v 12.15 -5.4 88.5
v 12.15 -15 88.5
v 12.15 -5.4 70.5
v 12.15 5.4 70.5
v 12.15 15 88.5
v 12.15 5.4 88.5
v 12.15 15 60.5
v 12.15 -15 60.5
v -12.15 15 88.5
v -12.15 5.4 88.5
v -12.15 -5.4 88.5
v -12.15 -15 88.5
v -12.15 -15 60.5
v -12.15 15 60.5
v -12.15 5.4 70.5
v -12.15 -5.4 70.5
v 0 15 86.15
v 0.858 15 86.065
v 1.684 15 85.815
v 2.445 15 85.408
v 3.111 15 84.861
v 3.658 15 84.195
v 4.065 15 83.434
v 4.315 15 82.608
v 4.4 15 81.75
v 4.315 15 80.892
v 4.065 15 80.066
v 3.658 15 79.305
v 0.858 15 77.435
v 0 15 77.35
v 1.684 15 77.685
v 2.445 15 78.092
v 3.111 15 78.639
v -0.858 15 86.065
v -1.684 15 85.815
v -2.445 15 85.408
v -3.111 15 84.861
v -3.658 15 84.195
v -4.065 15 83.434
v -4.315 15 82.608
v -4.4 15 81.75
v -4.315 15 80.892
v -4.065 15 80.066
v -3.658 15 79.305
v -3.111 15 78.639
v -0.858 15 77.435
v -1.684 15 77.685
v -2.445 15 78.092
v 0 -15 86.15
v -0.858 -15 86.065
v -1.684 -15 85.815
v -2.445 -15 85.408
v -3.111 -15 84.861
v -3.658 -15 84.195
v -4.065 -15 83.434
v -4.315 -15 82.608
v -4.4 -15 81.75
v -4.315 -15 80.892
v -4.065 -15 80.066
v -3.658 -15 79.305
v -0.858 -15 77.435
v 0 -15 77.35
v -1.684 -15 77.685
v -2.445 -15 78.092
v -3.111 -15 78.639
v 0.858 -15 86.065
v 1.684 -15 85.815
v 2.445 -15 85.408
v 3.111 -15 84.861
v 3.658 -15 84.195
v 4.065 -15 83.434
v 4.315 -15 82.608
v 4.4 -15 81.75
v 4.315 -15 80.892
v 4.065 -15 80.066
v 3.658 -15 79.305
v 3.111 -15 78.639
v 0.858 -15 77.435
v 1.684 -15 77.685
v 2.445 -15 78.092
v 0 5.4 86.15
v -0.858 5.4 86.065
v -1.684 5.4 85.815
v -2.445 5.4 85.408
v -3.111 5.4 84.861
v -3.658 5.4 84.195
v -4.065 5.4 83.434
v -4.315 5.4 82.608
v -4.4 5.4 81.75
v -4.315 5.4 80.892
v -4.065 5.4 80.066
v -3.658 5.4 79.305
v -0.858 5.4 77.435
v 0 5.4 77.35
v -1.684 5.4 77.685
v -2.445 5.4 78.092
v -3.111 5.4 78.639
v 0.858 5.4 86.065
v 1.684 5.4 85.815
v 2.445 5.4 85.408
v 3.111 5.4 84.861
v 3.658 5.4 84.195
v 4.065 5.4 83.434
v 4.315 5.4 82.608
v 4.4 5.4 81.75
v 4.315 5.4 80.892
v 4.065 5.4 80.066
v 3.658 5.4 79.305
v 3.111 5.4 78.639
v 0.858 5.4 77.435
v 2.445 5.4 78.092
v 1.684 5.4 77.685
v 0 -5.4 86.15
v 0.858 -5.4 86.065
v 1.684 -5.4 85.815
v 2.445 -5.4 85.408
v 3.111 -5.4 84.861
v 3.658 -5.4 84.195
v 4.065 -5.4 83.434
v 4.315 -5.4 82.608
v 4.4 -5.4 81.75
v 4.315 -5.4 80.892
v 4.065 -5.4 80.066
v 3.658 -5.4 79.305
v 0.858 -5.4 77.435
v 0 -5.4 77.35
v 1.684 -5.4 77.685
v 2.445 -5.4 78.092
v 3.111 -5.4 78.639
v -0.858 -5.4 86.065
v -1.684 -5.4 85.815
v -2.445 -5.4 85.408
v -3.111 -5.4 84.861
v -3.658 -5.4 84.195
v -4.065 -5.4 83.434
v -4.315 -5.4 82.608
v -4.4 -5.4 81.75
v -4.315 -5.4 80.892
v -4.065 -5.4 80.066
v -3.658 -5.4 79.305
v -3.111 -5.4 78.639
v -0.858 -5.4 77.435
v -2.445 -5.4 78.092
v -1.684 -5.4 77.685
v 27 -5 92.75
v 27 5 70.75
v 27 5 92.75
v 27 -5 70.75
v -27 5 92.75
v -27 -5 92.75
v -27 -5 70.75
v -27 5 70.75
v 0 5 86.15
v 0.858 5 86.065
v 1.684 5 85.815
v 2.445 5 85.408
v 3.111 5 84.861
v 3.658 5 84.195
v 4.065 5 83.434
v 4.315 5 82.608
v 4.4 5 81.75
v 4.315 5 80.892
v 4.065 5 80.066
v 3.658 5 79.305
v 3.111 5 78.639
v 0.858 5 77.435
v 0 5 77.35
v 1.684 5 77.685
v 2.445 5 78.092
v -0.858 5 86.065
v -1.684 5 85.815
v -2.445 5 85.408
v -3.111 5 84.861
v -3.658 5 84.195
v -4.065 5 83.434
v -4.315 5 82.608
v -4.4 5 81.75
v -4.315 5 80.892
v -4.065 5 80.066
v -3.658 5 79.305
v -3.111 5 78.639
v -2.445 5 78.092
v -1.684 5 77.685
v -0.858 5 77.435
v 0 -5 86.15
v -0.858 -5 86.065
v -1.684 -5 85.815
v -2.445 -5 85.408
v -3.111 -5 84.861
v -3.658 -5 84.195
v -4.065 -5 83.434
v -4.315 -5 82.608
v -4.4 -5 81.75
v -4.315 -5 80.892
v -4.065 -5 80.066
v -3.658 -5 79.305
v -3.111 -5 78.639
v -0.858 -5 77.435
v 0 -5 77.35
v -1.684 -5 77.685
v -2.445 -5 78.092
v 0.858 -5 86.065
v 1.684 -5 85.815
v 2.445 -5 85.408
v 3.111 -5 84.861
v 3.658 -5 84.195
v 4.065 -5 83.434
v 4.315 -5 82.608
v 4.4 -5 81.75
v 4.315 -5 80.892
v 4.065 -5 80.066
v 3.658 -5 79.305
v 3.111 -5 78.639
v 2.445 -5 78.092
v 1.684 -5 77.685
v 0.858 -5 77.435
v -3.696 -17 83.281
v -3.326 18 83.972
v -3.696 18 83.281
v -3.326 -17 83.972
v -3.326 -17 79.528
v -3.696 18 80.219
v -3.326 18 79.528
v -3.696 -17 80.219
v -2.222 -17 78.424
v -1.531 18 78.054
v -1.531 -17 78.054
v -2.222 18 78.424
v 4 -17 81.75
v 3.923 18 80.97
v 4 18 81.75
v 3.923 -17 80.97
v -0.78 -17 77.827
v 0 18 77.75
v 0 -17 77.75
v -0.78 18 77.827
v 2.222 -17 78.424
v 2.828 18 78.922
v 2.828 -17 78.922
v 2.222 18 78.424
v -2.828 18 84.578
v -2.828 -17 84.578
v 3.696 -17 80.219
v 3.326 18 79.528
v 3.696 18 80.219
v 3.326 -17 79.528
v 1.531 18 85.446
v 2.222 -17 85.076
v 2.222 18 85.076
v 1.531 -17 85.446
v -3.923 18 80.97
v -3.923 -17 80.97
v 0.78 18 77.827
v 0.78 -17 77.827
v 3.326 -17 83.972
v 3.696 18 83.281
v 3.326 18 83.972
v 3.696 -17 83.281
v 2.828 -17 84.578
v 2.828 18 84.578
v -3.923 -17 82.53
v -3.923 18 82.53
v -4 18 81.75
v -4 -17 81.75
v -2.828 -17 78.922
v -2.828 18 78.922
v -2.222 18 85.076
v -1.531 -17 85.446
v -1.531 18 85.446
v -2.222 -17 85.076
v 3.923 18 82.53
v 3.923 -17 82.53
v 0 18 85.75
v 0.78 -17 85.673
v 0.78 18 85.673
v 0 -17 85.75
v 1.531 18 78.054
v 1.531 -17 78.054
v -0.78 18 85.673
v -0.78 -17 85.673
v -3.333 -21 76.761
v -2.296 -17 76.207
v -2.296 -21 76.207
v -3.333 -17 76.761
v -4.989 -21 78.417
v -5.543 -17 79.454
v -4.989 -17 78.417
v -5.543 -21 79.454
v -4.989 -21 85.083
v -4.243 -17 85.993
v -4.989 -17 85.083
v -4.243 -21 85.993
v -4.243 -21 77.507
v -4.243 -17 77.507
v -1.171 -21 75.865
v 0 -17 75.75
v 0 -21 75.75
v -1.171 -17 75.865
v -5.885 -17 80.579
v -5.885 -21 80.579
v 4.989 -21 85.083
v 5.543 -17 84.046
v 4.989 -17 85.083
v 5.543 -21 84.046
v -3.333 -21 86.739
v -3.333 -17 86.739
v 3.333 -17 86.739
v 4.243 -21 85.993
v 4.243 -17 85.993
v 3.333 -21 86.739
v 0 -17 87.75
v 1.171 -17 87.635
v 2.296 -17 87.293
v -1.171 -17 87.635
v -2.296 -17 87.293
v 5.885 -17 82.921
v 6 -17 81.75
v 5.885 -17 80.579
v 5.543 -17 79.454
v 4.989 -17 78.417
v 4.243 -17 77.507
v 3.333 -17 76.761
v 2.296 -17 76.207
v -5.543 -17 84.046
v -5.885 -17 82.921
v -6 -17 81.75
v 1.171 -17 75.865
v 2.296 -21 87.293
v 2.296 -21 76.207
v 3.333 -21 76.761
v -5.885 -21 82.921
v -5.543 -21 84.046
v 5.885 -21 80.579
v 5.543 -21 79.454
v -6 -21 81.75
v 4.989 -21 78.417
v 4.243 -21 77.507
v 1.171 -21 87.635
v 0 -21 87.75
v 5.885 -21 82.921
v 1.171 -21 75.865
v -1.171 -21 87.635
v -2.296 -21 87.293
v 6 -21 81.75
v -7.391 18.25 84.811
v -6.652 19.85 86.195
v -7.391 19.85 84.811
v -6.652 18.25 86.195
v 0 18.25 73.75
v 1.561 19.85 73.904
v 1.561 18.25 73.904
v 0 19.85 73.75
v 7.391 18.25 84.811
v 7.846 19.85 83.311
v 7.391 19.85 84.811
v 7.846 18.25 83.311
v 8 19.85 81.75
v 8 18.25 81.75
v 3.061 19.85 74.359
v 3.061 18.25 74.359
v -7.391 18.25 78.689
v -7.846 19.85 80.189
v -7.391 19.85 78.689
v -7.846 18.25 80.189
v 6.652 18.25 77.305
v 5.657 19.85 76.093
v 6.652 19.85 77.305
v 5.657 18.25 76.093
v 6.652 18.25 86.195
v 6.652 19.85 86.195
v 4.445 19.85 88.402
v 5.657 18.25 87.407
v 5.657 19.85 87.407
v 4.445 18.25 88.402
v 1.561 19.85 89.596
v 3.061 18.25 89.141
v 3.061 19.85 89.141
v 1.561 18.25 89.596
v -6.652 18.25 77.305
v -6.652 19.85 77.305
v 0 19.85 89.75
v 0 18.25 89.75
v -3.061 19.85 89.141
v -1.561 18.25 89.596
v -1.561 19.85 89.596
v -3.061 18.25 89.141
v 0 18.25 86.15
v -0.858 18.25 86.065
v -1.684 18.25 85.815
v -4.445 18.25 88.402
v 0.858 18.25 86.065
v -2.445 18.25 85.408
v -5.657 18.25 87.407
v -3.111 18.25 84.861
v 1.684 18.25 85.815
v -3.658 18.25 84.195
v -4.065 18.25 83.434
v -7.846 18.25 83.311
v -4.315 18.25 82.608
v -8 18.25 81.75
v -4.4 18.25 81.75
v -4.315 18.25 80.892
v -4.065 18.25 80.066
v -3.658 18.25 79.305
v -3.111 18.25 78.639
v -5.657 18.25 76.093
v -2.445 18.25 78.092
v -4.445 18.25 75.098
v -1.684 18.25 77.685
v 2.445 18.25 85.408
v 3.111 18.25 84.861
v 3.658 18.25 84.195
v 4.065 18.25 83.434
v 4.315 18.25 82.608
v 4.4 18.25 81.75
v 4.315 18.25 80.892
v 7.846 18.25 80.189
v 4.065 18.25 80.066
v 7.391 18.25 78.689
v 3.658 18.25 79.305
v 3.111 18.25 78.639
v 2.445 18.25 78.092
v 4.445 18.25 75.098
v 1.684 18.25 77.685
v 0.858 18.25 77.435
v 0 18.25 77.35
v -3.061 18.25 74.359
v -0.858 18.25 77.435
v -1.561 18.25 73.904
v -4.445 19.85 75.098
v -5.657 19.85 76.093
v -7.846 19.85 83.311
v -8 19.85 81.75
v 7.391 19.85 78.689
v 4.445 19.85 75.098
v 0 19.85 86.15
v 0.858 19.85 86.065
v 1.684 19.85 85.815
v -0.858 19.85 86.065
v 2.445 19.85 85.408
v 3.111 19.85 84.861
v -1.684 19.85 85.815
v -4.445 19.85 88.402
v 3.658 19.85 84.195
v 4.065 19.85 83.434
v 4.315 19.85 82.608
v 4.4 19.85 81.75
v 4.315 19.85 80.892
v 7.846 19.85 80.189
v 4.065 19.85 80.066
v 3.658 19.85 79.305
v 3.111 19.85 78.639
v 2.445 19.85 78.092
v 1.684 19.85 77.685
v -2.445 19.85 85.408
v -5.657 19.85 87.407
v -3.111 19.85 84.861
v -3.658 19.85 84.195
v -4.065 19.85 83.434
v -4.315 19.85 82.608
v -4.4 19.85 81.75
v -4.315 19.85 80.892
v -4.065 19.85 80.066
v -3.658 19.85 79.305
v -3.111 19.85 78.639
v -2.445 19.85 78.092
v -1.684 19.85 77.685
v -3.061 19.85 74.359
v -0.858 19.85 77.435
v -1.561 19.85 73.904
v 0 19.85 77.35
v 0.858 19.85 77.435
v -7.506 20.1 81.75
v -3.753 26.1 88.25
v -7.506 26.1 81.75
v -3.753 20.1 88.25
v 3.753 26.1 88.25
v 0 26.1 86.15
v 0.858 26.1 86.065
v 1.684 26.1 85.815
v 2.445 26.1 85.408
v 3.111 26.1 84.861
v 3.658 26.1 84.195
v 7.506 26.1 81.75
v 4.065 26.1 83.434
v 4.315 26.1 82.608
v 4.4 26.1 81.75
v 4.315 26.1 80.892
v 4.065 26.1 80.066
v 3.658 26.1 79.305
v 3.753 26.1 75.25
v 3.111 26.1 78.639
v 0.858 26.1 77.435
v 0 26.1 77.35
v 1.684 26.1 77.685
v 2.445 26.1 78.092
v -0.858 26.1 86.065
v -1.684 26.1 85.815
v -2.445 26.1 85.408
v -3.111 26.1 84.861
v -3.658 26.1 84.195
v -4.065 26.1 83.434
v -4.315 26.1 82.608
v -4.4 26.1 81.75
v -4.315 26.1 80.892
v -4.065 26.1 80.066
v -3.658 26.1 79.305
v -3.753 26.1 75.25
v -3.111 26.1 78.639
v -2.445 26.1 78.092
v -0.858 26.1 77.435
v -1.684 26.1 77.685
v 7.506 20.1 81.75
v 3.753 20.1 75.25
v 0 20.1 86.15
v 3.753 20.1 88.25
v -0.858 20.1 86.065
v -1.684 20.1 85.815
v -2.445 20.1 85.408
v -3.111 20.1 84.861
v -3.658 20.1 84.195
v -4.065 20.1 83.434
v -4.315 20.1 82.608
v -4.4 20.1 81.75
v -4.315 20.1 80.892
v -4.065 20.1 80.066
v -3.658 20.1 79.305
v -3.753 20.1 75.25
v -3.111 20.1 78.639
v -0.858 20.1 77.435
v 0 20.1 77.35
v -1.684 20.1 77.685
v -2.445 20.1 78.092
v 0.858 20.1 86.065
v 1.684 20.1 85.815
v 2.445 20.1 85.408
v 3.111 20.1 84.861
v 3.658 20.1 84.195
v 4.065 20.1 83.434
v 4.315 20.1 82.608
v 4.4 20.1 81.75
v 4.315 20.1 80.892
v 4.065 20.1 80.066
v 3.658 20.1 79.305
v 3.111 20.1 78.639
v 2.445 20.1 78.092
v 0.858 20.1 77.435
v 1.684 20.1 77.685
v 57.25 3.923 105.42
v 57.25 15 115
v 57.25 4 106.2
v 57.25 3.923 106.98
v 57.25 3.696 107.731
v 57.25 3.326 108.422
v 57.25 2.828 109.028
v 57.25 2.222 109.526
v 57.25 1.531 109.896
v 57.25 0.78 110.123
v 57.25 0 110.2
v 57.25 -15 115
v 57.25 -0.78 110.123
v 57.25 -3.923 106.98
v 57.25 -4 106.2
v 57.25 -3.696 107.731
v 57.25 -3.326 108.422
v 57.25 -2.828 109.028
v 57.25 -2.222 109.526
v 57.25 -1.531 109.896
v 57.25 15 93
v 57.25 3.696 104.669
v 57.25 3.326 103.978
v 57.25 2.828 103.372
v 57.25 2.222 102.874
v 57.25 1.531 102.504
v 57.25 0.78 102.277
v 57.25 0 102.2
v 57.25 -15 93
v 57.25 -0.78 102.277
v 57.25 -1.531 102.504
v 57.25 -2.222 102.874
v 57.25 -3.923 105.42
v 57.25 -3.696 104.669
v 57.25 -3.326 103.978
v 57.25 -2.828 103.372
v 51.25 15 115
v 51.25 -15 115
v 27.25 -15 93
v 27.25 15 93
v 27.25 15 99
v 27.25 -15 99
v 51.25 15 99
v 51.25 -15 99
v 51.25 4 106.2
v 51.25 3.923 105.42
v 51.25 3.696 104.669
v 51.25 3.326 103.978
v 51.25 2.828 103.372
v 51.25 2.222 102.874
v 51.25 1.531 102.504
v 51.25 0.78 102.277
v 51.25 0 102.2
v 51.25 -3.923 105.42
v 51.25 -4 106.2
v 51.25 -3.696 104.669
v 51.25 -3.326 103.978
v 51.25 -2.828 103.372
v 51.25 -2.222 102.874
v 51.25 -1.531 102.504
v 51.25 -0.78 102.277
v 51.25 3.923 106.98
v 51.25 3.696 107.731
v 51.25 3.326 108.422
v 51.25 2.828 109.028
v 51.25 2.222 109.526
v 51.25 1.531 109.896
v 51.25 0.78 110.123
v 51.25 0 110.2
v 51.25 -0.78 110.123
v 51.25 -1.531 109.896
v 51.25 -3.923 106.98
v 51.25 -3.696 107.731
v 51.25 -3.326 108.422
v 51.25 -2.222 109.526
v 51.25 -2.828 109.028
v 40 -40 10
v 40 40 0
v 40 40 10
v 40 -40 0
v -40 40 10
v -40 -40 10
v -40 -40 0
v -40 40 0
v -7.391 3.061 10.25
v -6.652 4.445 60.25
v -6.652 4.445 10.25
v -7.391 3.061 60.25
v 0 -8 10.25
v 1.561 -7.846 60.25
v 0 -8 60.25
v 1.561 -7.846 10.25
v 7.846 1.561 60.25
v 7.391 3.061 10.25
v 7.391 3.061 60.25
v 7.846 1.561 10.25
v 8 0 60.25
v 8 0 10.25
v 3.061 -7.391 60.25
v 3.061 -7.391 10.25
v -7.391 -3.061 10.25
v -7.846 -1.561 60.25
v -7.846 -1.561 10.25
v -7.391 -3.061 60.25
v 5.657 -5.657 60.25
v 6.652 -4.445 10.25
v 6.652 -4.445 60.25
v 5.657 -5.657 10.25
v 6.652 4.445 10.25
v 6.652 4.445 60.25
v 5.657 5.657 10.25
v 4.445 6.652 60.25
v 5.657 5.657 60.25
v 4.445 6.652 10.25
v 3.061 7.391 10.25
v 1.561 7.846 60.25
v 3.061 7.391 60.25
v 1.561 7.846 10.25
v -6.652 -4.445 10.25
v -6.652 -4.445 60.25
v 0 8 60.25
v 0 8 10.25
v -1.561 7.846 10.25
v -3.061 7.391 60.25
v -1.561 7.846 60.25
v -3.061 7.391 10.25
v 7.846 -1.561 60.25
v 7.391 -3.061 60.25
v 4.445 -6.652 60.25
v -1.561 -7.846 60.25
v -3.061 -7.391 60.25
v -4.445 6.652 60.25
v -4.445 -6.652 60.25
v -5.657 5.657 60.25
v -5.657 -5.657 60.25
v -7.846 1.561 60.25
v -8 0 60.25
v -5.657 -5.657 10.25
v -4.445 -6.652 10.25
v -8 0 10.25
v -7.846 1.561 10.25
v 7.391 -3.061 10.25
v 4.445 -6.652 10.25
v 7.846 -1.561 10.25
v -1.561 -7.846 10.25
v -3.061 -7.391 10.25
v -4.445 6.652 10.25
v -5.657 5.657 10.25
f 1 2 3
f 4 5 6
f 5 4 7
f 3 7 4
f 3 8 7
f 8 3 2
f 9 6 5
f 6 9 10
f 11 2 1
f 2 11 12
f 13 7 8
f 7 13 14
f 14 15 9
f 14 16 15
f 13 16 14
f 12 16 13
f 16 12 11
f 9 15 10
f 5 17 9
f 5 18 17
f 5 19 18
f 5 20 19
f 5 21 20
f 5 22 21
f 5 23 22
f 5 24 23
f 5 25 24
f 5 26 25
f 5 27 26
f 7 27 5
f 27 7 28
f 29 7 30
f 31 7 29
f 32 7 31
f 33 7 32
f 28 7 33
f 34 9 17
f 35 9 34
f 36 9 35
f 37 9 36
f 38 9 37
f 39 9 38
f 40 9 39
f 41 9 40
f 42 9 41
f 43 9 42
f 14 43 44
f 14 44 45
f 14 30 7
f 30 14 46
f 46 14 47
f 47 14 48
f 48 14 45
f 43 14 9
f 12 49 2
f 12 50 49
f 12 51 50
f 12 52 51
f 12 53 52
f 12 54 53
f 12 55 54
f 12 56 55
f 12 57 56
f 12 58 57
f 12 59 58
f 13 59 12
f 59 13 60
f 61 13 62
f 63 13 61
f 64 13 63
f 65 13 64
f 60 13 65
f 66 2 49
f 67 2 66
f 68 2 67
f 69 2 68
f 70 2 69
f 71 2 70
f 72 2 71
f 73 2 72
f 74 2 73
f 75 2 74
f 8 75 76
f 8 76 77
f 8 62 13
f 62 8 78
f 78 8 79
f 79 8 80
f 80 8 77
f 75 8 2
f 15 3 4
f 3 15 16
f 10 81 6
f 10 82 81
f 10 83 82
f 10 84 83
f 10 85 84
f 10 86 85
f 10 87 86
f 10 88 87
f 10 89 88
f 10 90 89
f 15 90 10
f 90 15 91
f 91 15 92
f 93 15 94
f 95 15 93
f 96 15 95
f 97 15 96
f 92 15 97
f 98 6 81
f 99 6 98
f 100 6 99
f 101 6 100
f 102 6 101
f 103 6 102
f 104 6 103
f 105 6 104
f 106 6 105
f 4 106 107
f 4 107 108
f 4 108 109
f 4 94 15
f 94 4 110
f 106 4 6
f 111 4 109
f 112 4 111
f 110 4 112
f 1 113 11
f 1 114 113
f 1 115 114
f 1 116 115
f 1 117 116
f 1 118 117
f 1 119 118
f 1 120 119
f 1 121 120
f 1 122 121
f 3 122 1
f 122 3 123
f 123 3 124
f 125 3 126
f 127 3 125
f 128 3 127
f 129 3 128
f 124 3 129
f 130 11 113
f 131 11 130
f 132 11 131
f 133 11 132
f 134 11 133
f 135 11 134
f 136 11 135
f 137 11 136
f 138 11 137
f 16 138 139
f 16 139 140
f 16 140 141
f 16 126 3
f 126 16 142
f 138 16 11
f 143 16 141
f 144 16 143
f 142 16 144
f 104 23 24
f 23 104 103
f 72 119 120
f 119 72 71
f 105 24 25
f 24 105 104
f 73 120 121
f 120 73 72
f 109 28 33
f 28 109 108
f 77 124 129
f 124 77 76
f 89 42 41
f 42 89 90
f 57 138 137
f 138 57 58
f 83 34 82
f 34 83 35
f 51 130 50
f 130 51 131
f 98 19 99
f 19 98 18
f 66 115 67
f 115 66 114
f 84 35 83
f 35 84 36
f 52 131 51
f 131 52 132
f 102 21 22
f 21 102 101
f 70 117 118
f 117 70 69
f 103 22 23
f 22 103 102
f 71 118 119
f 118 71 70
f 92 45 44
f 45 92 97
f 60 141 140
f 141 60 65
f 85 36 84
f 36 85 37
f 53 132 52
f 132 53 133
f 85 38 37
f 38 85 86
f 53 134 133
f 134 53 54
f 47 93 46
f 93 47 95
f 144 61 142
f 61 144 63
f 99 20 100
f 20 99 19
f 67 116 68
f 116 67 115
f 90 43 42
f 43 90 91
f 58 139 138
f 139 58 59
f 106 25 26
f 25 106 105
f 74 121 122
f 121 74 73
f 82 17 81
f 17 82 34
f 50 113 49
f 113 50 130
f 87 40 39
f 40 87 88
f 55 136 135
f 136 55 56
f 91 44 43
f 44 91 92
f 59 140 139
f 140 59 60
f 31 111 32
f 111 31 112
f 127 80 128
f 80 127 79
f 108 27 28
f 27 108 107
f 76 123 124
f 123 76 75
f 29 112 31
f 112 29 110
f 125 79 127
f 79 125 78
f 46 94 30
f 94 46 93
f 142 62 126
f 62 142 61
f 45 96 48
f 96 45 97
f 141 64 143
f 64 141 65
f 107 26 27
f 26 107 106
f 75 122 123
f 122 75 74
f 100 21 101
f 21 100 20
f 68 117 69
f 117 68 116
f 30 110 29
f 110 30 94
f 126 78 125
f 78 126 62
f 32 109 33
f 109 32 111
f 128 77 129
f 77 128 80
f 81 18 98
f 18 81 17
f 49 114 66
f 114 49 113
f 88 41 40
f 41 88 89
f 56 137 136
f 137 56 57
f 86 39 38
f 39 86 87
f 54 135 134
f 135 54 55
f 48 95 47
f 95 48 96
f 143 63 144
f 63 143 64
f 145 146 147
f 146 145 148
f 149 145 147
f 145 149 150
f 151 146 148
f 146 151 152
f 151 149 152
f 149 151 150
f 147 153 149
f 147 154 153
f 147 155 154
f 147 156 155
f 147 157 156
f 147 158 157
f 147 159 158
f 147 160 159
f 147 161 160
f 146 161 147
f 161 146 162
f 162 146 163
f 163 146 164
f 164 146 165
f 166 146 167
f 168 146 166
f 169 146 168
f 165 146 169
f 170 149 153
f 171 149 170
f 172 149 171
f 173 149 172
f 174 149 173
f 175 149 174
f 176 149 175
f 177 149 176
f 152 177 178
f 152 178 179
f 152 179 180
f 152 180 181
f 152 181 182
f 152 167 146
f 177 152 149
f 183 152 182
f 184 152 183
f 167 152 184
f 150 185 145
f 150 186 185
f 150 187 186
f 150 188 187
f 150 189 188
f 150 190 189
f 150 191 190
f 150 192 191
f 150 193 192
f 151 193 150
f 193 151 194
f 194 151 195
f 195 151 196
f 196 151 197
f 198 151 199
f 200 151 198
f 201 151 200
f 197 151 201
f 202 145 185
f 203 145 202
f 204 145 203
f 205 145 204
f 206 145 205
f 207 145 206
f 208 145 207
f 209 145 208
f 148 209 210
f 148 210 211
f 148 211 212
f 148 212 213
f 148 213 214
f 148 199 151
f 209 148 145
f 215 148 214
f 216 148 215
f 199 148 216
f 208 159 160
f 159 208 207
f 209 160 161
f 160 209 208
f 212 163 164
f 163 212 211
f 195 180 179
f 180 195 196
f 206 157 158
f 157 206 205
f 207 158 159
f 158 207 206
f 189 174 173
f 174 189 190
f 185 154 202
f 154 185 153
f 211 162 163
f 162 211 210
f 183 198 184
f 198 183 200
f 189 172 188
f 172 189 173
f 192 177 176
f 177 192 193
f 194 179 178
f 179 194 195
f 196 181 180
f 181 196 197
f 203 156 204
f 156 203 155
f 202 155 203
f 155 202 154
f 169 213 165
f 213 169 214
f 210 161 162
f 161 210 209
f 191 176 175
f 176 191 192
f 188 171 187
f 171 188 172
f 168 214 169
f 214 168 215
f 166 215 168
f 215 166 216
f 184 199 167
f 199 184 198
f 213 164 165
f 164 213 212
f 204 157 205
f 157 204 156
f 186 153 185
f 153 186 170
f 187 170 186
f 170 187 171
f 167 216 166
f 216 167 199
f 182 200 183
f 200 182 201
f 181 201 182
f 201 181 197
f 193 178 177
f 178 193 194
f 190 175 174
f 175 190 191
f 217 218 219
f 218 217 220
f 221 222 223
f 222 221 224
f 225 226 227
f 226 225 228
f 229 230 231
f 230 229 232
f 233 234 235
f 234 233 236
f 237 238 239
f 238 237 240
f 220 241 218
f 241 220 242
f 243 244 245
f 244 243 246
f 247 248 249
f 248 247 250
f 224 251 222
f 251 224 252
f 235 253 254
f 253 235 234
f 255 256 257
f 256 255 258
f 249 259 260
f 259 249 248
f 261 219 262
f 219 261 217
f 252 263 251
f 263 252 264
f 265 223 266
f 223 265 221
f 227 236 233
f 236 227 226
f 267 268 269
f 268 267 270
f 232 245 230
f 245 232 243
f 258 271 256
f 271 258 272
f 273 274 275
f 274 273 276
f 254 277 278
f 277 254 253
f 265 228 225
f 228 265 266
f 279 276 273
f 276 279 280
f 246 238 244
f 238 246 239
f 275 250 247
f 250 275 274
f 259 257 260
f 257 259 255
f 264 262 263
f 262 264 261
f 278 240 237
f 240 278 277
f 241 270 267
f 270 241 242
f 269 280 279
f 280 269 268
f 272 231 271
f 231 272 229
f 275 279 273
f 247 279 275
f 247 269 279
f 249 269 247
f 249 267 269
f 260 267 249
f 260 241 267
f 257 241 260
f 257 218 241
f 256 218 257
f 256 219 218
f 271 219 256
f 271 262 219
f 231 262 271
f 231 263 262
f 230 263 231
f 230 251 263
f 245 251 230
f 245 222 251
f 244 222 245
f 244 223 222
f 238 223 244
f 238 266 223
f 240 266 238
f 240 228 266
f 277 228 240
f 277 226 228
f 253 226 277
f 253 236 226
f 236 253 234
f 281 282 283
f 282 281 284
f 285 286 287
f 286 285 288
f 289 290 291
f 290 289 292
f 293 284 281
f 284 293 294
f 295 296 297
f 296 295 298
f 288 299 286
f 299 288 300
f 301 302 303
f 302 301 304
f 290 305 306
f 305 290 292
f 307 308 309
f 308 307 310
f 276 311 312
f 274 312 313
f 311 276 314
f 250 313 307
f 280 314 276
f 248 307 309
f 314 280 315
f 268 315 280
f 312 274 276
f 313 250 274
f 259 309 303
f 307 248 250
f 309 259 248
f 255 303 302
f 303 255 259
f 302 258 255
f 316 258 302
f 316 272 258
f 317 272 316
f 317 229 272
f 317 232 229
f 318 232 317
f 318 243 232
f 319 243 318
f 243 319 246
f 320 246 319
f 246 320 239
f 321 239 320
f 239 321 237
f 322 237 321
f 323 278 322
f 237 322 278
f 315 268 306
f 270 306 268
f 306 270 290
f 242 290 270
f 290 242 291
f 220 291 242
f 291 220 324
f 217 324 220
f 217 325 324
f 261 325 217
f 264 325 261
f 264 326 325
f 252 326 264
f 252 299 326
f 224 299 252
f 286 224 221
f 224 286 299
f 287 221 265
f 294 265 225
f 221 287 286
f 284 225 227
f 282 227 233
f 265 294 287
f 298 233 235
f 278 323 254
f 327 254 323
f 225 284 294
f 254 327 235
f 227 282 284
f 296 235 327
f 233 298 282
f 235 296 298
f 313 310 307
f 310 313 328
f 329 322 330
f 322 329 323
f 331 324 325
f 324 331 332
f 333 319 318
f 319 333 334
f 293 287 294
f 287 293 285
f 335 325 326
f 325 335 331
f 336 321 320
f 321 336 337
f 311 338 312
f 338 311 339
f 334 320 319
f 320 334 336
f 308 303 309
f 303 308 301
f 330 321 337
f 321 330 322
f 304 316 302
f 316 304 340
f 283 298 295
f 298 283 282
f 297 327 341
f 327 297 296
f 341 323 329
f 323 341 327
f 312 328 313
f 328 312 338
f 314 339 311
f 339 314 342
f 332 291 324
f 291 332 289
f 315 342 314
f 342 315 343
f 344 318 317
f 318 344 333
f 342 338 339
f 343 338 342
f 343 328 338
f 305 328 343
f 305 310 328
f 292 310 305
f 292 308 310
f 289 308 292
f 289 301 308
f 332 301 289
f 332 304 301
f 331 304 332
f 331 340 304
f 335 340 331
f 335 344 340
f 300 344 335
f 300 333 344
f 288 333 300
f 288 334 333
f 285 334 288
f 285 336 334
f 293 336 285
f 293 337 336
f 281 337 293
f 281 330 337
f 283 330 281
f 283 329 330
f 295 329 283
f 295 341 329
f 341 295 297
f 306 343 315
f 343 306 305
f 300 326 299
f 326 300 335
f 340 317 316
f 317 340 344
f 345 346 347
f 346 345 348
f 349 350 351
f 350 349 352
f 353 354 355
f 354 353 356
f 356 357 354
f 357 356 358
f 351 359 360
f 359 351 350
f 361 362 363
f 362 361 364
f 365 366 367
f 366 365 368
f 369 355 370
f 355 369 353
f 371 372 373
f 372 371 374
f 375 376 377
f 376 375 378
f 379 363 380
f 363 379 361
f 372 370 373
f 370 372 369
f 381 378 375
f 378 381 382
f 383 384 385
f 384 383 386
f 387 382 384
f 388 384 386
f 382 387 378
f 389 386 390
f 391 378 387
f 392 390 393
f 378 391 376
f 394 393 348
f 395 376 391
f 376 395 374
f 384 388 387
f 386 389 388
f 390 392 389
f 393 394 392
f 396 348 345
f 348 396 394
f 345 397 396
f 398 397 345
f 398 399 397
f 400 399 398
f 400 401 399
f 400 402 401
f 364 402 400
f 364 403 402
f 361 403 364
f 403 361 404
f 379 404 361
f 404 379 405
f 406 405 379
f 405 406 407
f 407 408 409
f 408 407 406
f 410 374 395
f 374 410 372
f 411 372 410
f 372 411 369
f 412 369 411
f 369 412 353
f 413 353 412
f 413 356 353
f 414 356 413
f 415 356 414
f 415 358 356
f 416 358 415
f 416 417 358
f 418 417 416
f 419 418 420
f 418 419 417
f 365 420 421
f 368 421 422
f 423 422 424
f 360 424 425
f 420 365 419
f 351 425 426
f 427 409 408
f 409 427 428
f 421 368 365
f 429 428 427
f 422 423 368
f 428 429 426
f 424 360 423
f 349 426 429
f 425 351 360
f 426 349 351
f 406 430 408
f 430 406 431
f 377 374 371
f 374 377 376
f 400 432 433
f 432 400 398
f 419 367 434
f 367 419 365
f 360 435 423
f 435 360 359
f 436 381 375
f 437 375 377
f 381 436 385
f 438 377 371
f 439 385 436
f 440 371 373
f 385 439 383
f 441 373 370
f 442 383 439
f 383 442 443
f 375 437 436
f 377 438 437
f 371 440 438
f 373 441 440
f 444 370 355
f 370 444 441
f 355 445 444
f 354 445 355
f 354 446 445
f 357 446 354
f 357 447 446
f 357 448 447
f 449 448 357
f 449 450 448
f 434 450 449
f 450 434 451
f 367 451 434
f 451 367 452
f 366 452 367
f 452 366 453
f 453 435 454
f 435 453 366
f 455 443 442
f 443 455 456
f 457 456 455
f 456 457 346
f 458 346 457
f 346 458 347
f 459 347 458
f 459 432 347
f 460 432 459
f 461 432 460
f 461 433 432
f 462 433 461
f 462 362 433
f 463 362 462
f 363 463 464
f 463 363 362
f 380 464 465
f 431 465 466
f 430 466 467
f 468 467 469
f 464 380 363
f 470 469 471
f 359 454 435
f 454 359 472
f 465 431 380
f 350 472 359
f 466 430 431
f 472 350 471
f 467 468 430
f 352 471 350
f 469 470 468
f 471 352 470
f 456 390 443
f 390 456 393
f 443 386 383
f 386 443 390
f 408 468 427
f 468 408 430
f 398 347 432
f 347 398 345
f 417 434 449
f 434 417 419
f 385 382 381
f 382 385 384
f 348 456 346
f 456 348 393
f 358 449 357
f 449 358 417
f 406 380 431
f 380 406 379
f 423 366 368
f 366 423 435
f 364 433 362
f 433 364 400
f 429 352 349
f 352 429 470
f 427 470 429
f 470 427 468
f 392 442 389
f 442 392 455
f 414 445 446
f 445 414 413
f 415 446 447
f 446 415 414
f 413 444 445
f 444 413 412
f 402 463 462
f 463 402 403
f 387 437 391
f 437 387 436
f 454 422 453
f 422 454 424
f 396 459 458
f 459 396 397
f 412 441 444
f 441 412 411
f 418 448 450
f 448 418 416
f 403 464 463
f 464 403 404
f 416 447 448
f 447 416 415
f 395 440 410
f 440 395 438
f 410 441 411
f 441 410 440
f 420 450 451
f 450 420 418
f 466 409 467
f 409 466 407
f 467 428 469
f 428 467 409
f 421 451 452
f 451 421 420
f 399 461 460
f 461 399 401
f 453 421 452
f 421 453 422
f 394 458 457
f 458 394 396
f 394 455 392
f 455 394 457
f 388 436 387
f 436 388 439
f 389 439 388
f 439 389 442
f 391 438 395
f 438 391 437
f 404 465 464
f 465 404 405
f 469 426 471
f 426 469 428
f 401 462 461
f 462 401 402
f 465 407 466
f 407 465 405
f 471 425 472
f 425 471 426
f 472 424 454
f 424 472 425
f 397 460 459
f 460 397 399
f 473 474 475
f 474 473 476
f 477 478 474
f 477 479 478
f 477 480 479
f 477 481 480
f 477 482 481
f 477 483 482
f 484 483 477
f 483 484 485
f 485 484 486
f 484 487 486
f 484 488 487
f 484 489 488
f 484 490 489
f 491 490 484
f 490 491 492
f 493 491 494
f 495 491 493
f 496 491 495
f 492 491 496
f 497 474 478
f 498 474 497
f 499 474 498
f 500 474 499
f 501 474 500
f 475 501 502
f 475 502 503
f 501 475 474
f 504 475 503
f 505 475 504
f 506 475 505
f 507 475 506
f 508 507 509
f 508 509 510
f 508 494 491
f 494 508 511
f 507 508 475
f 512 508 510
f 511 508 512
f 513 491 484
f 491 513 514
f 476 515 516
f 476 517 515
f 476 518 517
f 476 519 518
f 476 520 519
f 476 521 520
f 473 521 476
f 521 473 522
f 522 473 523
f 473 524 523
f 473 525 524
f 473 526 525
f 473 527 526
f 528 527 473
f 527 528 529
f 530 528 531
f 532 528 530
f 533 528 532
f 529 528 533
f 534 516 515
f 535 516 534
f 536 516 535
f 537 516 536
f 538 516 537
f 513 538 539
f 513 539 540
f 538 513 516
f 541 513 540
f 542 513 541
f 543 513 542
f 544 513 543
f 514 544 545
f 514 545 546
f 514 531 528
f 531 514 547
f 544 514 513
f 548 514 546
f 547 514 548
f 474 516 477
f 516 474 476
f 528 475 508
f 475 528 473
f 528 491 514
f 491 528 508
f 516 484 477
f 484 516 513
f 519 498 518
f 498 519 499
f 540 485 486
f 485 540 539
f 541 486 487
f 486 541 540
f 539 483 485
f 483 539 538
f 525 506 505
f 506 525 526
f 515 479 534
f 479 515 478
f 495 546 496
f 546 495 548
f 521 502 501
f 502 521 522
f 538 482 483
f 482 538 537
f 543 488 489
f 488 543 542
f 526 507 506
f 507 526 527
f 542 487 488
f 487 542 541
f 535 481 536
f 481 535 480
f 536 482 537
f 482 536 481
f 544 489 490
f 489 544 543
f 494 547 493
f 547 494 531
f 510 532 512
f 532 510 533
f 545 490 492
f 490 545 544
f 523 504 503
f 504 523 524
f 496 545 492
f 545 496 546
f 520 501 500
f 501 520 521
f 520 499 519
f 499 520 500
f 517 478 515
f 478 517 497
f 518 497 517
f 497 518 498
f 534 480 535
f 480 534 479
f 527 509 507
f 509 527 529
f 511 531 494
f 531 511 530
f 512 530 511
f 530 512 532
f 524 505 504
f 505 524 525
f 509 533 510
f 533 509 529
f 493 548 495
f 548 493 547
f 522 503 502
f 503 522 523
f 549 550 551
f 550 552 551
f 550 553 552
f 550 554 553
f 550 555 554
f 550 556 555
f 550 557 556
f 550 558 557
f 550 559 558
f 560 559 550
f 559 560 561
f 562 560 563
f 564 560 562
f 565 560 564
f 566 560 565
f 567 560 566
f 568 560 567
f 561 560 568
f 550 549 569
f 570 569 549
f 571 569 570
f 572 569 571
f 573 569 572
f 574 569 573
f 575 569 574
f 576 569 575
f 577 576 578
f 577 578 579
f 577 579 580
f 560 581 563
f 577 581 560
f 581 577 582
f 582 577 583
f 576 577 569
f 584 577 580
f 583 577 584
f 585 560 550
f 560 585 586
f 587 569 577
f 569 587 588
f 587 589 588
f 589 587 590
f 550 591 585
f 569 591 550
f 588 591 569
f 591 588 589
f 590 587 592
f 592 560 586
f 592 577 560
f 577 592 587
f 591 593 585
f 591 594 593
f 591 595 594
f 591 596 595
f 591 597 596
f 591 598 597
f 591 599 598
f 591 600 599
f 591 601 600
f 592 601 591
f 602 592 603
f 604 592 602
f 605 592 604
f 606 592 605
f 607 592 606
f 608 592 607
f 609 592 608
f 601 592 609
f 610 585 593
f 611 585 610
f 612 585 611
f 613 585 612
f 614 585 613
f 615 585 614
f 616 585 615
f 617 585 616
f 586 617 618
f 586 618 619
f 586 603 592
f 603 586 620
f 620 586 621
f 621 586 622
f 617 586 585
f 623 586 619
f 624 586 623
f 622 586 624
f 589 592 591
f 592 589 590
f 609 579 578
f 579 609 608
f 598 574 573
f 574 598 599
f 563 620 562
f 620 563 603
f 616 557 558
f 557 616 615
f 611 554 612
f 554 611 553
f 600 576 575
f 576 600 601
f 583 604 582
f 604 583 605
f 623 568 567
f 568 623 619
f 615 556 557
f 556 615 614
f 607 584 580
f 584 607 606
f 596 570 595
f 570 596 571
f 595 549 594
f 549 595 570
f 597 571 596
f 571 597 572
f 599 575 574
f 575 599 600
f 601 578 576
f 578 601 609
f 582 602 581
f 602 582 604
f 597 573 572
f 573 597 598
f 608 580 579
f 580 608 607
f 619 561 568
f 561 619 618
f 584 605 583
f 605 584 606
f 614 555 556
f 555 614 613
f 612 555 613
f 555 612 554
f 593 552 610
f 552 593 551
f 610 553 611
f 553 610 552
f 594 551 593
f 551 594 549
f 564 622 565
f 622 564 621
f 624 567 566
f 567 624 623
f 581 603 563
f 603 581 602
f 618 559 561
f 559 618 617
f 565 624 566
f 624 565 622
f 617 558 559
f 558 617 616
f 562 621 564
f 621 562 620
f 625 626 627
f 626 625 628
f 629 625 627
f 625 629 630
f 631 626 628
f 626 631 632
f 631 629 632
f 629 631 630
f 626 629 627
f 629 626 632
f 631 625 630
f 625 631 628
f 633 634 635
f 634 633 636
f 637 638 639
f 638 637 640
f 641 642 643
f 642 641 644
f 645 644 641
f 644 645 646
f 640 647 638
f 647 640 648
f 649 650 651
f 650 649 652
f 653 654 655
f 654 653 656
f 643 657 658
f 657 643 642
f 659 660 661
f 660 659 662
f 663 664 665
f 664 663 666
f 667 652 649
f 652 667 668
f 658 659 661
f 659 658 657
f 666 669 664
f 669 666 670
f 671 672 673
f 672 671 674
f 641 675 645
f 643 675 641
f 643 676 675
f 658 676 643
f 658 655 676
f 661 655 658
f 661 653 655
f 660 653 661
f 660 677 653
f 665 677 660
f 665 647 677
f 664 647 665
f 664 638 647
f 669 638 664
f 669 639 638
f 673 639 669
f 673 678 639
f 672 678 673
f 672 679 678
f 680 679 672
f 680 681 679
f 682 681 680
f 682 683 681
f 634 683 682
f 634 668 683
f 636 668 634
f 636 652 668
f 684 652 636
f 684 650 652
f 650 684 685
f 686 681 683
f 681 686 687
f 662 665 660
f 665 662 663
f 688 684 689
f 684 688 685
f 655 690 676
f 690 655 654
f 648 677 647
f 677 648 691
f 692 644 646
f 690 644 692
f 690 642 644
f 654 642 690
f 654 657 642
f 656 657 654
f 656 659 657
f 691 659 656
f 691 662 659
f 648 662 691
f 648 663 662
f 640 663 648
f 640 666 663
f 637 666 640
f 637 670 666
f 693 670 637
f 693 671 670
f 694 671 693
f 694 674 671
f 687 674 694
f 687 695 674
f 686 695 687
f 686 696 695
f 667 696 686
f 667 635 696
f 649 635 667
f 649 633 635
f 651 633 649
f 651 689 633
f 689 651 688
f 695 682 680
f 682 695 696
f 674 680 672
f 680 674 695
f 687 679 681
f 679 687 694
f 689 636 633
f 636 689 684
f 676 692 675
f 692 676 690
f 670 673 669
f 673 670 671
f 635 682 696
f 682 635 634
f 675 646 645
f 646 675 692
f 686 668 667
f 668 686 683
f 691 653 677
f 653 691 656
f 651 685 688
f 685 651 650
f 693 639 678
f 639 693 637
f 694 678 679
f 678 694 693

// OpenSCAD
$fn = 32;

// ------------------------------------------------------------------------
// Lamp arm: column d16 x 50 mm, arm 54 mm
// Every part is its own module, assembly() places every instance.
// ------------------------------------------------------------------------

// --- part 1 ---
module lamp_base() {
  difference() {
    translate([-40, -40, 0]) cube([80, 80, 10]);
  }
}

// --- part 2 ---
module lamp_column() {
  cylinder(h = 50, d = 16);
}

// --- part 3 ---
module head_fork() {
  difference() {
    translate([-12.15, -15, 0]) cube([24.3, 30, 28]);
    translate([-13.15, -5.4, 10]) cube([26.3, 10.8, 19]);
    translate([0, 0, 21.25]) rotate([90, 0, 0]) cylinder(h = 32, d = 8.8, center = true);
  }
}

// --- part 4 ---
module lamp_arm() {
  difference() {
    translate([-27, -5, 0]) cube([54, 10, 22]);
    translate([0, 0, 11]) rotate([90, 0, 0]) cylinder(h = 12, d = 8.8, center = true);
  }
}

// --- part 5 ---
module arm_pin() {
  rotate([0, 90, 0]) cylinder(h = 36, d = 8, center = true);
  translate([-21, 0, 0]) rotate([0, 90, 0]) cylinder(h = 4, d = 12);
}

// --- part 6 ---
module arm_washer() {
  difference() {
      translate([0, 0, 0]) cylinder(h = 1.6, d = 16);
      translate([0, 0, -1]) cylinder(h = 3.6, d = 8.8);
    }
}

// --- part 7 ---
module arm_nut() {
  difference() {
    linear_extrude(height = 6) polygon(points = [[7.506, 0], [3.753, 6.5], [-3.753, 6.5], [-7.506, 0], [-3.753, -6.5], [3.753, -6.5]]);
    translate([0, 0, -1]) cylinder(h = 8, d = 8.8);
  }
}

// --- part 8 ---
module shade_bracket() {
  difference() {
    translate([-15, -15, 0]) cube([30, 30, 22]);
    translate([-16, -16, 6]) cube([25, 32, 17]);
    translate([12, 0, 13.2]) rotate([0, 90, 0]) cylinder(h = 8, d = 8, center = true);
  }
}

// --- assembly ---
module assembly() {
  color([0.80, 0.24, 0.20]) translate([0, 0, 0]) rotate([0, 0, 0]) lamp_base();
  color([0.20, 0.45, 0.75]) translate([0, 0, 10.25]) rotate([0, 0, 0]) lamp_column();
  color([0.25, 0.62, 0.32]) translate([0, 0, 60.5]) rotate([0, 0, 0]) head_fork();
  color([0.92, 0.70, 0.18]) translate([0, 0, 70.75]) rotate([0, 0, 0]) lamp_arm();
  color([0.58, 0.35, 0.70]) translate([0, 0, 81.75]) rotate([0, 0, 90]) arm_pin();
  color([0.16, 0.66, 0.66]) translate([0, 19.85, 81.75]) rotate([90, 0, 0]) arm_washer();
  color([0.85, 0.48, 0.18]) translate([0, 26.1, 81.75]) rotate([90, 0, 0]) arm_nut();
  color([0.55, 0.60, 0.65]) translate([42.25, 0, 93]) rotate([0, 0, 0]) shade_bracket();
}

assembly();
